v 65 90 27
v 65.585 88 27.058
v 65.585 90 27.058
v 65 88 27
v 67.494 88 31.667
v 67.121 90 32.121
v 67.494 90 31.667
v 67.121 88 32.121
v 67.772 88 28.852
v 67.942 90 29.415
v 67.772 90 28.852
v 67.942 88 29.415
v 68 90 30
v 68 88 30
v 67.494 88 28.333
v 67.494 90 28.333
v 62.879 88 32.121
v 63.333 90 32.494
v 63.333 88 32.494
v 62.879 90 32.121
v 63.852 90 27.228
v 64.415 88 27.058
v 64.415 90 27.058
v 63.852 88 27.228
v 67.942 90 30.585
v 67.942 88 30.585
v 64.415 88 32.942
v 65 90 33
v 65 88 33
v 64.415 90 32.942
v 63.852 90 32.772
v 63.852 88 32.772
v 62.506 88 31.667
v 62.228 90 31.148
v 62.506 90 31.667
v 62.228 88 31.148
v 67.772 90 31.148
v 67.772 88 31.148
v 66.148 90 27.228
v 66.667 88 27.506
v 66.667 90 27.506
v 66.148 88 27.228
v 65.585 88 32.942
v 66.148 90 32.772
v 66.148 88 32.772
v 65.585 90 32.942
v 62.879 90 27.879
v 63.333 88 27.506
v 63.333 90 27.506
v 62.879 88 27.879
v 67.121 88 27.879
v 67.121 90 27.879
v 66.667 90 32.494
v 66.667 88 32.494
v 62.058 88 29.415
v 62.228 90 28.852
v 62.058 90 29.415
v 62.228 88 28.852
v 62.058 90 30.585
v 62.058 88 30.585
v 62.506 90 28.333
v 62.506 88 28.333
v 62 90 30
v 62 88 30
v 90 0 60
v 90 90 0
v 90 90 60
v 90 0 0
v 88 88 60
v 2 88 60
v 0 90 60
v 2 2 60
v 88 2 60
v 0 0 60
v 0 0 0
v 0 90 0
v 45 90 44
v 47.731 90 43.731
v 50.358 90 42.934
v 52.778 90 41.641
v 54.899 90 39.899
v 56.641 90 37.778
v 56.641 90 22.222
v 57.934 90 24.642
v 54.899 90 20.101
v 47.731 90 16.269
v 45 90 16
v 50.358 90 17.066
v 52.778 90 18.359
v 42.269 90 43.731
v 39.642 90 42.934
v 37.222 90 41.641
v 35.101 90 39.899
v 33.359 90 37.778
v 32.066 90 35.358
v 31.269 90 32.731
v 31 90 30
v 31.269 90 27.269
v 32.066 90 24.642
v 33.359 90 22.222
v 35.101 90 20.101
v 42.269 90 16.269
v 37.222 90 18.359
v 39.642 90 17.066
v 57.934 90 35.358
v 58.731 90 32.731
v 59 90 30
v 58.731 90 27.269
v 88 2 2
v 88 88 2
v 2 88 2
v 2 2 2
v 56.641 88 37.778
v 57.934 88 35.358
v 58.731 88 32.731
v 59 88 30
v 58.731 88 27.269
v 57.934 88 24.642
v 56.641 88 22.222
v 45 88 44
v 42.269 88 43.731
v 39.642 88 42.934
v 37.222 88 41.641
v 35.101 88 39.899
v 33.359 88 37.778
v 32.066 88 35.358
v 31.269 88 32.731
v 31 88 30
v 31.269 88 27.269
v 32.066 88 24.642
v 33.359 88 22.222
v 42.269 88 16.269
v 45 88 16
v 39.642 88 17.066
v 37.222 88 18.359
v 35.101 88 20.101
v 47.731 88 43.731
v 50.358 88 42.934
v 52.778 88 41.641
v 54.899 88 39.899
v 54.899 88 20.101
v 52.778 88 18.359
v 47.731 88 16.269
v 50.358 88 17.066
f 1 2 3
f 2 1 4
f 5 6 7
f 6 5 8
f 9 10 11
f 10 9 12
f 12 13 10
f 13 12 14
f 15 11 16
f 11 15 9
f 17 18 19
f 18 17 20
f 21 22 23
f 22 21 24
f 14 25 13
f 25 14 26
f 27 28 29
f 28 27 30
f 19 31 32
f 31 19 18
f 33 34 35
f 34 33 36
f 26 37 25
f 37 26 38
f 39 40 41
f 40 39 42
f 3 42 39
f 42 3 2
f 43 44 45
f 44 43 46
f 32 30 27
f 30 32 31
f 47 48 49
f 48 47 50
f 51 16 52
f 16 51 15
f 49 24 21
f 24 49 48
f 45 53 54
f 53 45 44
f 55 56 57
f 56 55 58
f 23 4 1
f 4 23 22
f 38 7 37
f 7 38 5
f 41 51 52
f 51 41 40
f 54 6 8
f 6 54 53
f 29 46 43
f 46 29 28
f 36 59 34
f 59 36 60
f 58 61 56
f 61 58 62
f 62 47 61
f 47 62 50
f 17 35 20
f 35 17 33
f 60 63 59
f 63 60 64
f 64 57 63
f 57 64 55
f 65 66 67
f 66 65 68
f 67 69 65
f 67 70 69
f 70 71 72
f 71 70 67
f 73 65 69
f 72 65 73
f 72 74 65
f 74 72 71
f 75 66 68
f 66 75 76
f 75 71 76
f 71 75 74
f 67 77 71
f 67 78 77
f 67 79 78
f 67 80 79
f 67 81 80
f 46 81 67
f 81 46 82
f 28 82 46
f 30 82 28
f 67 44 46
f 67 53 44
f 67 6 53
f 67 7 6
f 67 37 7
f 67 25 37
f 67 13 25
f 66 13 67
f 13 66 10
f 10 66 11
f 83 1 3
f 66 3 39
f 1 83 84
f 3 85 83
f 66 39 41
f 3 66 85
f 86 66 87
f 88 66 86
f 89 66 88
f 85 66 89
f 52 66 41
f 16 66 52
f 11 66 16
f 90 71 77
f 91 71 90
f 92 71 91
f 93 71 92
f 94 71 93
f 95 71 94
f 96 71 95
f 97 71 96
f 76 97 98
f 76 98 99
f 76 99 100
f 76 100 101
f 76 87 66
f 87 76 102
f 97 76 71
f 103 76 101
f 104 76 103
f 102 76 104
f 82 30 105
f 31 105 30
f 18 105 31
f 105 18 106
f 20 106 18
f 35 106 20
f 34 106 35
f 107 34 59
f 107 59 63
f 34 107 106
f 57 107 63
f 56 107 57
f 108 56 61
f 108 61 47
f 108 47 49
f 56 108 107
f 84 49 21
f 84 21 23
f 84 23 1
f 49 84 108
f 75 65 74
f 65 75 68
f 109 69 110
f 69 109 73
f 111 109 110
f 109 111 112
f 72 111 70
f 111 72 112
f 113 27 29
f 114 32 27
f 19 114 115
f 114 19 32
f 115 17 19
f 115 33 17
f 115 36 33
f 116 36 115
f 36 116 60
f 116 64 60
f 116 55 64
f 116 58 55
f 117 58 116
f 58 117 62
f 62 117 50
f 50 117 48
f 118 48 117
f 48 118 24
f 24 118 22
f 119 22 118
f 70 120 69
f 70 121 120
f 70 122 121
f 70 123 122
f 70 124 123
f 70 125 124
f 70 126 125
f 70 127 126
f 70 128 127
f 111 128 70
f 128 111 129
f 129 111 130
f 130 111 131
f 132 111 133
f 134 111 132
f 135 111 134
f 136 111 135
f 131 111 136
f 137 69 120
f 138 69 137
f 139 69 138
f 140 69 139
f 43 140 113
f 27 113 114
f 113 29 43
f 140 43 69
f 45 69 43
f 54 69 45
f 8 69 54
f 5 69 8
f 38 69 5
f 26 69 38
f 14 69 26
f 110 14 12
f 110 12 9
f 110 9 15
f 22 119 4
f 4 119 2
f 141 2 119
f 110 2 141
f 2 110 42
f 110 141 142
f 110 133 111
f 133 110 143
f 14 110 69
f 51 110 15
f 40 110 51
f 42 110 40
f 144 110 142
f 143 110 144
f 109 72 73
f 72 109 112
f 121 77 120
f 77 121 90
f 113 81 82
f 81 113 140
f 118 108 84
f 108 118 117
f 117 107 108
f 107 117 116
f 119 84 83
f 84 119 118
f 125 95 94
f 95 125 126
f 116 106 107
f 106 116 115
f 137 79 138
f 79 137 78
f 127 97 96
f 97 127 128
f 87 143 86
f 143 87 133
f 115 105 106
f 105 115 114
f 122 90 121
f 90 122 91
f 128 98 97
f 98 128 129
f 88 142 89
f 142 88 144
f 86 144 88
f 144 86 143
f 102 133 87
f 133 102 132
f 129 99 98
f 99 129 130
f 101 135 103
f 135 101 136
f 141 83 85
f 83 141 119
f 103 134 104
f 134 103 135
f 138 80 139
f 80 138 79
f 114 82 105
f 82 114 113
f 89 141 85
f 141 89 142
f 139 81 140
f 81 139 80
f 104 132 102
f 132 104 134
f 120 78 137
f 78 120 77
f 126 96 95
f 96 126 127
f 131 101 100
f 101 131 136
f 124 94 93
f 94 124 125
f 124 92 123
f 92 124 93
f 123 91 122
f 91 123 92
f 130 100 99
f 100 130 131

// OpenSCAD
$fn = 32;

// ----------------------------------------------------------------------
// Vent box: roundvent enclosure
// ----------------------------------------------------------------------

// --- parameters (mm) ---
box_l = 90;               // box length, X
box_w = 90;               // box width, Y
box_h = 60;               // box height, Z
wall_t = 2;               // shell wall thickness
vent_d = 28;              // central vent diameter
ring_d = 6;               // ring hole diameter
n_ring = 6;               // holes in the ring
ring_r = 20;              // ring radius

ring_step = 360 / n_ring;  // ring hole angular step

difference() {
  cube([box_l, box_w, box_h]);
  translate([wall_t, wall_t, wall_t])
    cube([box_l - 2 * wall_t, box_w - 2 * wall_t, box_h]);
  translate([box_l / 2, box_w - wall_t - 1, box_h / 2])
    rotate([-90, 0, 0]) cylinder(h = wall_t + 2, d = vent_d);
  for (i = [0 : n_ring - 1])
    translate([box_l / 2, box_w - wall_t - 1, box_h / 2])
      rotate([0, 0, i * ring_step])
        translate([ring_r, 0, 0]) rotate([-90, 0, 0])
          cylinder(h = wall_t + 2, d = ring_d);
}
